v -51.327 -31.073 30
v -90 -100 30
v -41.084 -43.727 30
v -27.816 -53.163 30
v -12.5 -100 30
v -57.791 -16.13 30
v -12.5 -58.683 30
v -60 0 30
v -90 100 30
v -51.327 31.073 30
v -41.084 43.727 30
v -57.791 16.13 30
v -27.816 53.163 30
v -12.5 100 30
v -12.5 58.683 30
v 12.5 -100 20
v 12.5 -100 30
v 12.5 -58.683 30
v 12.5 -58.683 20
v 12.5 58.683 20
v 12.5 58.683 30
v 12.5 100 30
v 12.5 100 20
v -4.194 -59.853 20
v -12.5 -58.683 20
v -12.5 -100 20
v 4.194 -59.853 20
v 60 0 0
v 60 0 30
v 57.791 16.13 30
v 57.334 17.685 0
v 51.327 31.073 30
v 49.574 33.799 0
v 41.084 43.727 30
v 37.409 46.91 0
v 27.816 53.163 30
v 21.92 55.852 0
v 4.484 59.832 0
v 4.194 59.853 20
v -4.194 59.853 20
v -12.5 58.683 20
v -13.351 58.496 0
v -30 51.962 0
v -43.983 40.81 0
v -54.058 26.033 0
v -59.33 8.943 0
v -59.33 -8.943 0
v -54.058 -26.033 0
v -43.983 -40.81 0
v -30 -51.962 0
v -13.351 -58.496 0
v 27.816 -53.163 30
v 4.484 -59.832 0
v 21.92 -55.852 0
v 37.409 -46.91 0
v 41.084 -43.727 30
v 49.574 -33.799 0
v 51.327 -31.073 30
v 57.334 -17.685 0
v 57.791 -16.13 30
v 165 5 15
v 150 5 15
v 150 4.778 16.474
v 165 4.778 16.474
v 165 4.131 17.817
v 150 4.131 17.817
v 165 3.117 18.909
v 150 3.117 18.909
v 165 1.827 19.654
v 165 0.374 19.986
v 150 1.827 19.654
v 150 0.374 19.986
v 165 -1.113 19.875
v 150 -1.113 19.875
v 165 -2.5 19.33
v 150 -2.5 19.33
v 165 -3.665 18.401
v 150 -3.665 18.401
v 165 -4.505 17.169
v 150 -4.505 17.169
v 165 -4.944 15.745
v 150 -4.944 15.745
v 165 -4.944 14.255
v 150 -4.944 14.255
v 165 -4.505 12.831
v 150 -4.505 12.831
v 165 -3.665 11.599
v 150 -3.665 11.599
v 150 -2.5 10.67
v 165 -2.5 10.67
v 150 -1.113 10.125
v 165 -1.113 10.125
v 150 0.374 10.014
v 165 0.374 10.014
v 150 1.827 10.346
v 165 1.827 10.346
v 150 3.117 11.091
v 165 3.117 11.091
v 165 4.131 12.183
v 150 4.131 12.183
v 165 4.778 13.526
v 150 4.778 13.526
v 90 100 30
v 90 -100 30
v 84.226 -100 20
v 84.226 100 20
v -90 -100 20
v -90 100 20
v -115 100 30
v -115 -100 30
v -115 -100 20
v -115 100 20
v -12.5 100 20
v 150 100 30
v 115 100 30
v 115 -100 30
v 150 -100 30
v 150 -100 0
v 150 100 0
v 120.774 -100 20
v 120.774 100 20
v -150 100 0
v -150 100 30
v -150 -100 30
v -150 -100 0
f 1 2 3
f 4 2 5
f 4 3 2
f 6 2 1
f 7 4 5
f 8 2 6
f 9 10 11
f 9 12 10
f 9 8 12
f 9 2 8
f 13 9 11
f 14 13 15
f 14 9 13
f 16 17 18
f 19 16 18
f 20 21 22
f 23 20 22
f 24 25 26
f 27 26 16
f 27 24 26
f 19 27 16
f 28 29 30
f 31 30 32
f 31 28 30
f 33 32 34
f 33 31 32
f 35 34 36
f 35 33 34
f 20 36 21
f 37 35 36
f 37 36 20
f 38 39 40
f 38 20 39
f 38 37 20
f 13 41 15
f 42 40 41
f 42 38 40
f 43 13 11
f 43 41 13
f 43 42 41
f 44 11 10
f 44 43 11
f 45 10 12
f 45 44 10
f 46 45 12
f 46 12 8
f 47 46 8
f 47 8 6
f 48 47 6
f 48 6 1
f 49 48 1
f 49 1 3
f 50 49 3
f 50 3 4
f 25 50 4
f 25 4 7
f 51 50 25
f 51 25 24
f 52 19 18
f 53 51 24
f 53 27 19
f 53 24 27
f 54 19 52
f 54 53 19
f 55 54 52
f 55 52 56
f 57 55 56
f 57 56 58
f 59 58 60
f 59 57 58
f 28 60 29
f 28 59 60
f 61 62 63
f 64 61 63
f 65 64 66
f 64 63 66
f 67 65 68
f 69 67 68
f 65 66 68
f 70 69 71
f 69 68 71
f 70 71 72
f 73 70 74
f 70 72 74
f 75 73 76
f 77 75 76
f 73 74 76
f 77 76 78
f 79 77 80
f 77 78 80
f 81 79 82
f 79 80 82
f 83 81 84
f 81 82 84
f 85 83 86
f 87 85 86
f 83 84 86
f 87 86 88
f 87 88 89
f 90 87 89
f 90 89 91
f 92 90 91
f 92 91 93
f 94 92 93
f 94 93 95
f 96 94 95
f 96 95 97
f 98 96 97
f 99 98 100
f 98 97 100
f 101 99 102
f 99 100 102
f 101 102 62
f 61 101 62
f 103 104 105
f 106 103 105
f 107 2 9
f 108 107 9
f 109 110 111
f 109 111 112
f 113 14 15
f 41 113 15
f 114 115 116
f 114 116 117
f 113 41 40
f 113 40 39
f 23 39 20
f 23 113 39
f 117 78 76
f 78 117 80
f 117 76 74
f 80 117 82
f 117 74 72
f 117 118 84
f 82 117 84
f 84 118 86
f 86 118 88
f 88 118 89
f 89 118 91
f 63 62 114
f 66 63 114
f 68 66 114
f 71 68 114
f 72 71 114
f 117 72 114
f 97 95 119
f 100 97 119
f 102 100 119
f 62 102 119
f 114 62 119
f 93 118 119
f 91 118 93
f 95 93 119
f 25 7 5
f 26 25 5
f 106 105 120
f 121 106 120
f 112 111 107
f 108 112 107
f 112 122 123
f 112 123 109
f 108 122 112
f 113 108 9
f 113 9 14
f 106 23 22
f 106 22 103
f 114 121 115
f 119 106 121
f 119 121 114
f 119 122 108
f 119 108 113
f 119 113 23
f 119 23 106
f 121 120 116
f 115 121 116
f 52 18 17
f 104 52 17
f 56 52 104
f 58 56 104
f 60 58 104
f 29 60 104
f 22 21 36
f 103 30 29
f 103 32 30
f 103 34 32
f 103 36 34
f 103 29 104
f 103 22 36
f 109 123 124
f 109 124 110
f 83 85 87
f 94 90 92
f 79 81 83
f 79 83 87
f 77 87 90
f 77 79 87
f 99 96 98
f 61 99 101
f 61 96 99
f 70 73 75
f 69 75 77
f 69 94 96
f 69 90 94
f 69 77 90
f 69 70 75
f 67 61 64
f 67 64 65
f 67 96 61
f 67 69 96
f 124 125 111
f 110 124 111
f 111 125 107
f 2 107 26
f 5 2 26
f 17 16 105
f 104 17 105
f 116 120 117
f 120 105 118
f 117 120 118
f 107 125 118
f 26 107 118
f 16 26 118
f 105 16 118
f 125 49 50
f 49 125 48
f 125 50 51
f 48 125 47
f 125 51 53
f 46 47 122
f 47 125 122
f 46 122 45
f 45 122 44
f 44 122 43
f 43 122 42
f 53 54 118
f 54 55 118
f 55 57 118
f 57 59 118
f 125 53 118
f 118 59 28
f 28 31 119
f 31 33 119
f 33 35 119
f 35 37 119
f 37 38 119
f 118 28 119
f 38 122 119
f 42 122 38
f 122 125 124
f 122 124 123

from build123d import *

# Parameters (mm, degrees)
F0_W     = 300
F0_H     = 200
F0_R     = 60
F1_DEPTH = 30
F2_W     = 25
F2_H     = 200
F3_DEPTH = 10
F5_DEPTH = 200
F6_R     = 5
F7_DEPTH = 15


with BuildPart() as f1:
    # F0 (on Top) → F1 (new body)
    with BuildSketch(Plane.XY):
        Rectangle(F0_W, F0_H)
        Circle(F0_R, mode=Mode.SUBTRACT)
    extrude(amount=F1_DEPTH)

    # F2 (on face) → F3 (cut)
    with BuildSketch(Plane.XY.offset(30)):
        with Locations((-102.5, 0)):
            Rectangle(F2_W, F2_H)
        Rectangle(F2_W, F2_H)
        with BuildLine():
            Line((-12.5, -58.683473), (-12.5, -100))
            Line((-12.5, -100), (12.5, -100))
            Line((12.5, -100), (12.5, -58.683473))
            ThreePointArc((12.5, -58.683473), (0, -60), (-12.5, -58.683473))
        make_face()
        with BuildLine():
            Line((12.5, 100), (-12.5, 100))
            Line((-12.5, 100), (-12.5, 58.683473))
            ThreePointArc((-12.5, 58.683473), (0, 60), (12.5, 58.683473))
            Line((12.5, 58.683473), (12.5, 100))
        make_face()
    extrude(amount=-F3_DEPTH, mode=Mode.SUBTRACT)

    # F4 (on face) → F5 (cut, through all)
    with BuildSketch(Plane.XZ.offset(100)):
        Polygon((115, 30), (90, 30), (84.226497, 20), (120.773503, 20), align=None)
    extrude(amount=-F5_DEPTH, mode=Mode.SUBTRACT)

    # F6 (on face) → F7 (join)
    with BuildSketch(Plane.YZ.offset(150)):
        with Locations((0, 15)):
            Circle(F6_R)
    extrude(amount=F7_DEPTH)


solid = f1.part
